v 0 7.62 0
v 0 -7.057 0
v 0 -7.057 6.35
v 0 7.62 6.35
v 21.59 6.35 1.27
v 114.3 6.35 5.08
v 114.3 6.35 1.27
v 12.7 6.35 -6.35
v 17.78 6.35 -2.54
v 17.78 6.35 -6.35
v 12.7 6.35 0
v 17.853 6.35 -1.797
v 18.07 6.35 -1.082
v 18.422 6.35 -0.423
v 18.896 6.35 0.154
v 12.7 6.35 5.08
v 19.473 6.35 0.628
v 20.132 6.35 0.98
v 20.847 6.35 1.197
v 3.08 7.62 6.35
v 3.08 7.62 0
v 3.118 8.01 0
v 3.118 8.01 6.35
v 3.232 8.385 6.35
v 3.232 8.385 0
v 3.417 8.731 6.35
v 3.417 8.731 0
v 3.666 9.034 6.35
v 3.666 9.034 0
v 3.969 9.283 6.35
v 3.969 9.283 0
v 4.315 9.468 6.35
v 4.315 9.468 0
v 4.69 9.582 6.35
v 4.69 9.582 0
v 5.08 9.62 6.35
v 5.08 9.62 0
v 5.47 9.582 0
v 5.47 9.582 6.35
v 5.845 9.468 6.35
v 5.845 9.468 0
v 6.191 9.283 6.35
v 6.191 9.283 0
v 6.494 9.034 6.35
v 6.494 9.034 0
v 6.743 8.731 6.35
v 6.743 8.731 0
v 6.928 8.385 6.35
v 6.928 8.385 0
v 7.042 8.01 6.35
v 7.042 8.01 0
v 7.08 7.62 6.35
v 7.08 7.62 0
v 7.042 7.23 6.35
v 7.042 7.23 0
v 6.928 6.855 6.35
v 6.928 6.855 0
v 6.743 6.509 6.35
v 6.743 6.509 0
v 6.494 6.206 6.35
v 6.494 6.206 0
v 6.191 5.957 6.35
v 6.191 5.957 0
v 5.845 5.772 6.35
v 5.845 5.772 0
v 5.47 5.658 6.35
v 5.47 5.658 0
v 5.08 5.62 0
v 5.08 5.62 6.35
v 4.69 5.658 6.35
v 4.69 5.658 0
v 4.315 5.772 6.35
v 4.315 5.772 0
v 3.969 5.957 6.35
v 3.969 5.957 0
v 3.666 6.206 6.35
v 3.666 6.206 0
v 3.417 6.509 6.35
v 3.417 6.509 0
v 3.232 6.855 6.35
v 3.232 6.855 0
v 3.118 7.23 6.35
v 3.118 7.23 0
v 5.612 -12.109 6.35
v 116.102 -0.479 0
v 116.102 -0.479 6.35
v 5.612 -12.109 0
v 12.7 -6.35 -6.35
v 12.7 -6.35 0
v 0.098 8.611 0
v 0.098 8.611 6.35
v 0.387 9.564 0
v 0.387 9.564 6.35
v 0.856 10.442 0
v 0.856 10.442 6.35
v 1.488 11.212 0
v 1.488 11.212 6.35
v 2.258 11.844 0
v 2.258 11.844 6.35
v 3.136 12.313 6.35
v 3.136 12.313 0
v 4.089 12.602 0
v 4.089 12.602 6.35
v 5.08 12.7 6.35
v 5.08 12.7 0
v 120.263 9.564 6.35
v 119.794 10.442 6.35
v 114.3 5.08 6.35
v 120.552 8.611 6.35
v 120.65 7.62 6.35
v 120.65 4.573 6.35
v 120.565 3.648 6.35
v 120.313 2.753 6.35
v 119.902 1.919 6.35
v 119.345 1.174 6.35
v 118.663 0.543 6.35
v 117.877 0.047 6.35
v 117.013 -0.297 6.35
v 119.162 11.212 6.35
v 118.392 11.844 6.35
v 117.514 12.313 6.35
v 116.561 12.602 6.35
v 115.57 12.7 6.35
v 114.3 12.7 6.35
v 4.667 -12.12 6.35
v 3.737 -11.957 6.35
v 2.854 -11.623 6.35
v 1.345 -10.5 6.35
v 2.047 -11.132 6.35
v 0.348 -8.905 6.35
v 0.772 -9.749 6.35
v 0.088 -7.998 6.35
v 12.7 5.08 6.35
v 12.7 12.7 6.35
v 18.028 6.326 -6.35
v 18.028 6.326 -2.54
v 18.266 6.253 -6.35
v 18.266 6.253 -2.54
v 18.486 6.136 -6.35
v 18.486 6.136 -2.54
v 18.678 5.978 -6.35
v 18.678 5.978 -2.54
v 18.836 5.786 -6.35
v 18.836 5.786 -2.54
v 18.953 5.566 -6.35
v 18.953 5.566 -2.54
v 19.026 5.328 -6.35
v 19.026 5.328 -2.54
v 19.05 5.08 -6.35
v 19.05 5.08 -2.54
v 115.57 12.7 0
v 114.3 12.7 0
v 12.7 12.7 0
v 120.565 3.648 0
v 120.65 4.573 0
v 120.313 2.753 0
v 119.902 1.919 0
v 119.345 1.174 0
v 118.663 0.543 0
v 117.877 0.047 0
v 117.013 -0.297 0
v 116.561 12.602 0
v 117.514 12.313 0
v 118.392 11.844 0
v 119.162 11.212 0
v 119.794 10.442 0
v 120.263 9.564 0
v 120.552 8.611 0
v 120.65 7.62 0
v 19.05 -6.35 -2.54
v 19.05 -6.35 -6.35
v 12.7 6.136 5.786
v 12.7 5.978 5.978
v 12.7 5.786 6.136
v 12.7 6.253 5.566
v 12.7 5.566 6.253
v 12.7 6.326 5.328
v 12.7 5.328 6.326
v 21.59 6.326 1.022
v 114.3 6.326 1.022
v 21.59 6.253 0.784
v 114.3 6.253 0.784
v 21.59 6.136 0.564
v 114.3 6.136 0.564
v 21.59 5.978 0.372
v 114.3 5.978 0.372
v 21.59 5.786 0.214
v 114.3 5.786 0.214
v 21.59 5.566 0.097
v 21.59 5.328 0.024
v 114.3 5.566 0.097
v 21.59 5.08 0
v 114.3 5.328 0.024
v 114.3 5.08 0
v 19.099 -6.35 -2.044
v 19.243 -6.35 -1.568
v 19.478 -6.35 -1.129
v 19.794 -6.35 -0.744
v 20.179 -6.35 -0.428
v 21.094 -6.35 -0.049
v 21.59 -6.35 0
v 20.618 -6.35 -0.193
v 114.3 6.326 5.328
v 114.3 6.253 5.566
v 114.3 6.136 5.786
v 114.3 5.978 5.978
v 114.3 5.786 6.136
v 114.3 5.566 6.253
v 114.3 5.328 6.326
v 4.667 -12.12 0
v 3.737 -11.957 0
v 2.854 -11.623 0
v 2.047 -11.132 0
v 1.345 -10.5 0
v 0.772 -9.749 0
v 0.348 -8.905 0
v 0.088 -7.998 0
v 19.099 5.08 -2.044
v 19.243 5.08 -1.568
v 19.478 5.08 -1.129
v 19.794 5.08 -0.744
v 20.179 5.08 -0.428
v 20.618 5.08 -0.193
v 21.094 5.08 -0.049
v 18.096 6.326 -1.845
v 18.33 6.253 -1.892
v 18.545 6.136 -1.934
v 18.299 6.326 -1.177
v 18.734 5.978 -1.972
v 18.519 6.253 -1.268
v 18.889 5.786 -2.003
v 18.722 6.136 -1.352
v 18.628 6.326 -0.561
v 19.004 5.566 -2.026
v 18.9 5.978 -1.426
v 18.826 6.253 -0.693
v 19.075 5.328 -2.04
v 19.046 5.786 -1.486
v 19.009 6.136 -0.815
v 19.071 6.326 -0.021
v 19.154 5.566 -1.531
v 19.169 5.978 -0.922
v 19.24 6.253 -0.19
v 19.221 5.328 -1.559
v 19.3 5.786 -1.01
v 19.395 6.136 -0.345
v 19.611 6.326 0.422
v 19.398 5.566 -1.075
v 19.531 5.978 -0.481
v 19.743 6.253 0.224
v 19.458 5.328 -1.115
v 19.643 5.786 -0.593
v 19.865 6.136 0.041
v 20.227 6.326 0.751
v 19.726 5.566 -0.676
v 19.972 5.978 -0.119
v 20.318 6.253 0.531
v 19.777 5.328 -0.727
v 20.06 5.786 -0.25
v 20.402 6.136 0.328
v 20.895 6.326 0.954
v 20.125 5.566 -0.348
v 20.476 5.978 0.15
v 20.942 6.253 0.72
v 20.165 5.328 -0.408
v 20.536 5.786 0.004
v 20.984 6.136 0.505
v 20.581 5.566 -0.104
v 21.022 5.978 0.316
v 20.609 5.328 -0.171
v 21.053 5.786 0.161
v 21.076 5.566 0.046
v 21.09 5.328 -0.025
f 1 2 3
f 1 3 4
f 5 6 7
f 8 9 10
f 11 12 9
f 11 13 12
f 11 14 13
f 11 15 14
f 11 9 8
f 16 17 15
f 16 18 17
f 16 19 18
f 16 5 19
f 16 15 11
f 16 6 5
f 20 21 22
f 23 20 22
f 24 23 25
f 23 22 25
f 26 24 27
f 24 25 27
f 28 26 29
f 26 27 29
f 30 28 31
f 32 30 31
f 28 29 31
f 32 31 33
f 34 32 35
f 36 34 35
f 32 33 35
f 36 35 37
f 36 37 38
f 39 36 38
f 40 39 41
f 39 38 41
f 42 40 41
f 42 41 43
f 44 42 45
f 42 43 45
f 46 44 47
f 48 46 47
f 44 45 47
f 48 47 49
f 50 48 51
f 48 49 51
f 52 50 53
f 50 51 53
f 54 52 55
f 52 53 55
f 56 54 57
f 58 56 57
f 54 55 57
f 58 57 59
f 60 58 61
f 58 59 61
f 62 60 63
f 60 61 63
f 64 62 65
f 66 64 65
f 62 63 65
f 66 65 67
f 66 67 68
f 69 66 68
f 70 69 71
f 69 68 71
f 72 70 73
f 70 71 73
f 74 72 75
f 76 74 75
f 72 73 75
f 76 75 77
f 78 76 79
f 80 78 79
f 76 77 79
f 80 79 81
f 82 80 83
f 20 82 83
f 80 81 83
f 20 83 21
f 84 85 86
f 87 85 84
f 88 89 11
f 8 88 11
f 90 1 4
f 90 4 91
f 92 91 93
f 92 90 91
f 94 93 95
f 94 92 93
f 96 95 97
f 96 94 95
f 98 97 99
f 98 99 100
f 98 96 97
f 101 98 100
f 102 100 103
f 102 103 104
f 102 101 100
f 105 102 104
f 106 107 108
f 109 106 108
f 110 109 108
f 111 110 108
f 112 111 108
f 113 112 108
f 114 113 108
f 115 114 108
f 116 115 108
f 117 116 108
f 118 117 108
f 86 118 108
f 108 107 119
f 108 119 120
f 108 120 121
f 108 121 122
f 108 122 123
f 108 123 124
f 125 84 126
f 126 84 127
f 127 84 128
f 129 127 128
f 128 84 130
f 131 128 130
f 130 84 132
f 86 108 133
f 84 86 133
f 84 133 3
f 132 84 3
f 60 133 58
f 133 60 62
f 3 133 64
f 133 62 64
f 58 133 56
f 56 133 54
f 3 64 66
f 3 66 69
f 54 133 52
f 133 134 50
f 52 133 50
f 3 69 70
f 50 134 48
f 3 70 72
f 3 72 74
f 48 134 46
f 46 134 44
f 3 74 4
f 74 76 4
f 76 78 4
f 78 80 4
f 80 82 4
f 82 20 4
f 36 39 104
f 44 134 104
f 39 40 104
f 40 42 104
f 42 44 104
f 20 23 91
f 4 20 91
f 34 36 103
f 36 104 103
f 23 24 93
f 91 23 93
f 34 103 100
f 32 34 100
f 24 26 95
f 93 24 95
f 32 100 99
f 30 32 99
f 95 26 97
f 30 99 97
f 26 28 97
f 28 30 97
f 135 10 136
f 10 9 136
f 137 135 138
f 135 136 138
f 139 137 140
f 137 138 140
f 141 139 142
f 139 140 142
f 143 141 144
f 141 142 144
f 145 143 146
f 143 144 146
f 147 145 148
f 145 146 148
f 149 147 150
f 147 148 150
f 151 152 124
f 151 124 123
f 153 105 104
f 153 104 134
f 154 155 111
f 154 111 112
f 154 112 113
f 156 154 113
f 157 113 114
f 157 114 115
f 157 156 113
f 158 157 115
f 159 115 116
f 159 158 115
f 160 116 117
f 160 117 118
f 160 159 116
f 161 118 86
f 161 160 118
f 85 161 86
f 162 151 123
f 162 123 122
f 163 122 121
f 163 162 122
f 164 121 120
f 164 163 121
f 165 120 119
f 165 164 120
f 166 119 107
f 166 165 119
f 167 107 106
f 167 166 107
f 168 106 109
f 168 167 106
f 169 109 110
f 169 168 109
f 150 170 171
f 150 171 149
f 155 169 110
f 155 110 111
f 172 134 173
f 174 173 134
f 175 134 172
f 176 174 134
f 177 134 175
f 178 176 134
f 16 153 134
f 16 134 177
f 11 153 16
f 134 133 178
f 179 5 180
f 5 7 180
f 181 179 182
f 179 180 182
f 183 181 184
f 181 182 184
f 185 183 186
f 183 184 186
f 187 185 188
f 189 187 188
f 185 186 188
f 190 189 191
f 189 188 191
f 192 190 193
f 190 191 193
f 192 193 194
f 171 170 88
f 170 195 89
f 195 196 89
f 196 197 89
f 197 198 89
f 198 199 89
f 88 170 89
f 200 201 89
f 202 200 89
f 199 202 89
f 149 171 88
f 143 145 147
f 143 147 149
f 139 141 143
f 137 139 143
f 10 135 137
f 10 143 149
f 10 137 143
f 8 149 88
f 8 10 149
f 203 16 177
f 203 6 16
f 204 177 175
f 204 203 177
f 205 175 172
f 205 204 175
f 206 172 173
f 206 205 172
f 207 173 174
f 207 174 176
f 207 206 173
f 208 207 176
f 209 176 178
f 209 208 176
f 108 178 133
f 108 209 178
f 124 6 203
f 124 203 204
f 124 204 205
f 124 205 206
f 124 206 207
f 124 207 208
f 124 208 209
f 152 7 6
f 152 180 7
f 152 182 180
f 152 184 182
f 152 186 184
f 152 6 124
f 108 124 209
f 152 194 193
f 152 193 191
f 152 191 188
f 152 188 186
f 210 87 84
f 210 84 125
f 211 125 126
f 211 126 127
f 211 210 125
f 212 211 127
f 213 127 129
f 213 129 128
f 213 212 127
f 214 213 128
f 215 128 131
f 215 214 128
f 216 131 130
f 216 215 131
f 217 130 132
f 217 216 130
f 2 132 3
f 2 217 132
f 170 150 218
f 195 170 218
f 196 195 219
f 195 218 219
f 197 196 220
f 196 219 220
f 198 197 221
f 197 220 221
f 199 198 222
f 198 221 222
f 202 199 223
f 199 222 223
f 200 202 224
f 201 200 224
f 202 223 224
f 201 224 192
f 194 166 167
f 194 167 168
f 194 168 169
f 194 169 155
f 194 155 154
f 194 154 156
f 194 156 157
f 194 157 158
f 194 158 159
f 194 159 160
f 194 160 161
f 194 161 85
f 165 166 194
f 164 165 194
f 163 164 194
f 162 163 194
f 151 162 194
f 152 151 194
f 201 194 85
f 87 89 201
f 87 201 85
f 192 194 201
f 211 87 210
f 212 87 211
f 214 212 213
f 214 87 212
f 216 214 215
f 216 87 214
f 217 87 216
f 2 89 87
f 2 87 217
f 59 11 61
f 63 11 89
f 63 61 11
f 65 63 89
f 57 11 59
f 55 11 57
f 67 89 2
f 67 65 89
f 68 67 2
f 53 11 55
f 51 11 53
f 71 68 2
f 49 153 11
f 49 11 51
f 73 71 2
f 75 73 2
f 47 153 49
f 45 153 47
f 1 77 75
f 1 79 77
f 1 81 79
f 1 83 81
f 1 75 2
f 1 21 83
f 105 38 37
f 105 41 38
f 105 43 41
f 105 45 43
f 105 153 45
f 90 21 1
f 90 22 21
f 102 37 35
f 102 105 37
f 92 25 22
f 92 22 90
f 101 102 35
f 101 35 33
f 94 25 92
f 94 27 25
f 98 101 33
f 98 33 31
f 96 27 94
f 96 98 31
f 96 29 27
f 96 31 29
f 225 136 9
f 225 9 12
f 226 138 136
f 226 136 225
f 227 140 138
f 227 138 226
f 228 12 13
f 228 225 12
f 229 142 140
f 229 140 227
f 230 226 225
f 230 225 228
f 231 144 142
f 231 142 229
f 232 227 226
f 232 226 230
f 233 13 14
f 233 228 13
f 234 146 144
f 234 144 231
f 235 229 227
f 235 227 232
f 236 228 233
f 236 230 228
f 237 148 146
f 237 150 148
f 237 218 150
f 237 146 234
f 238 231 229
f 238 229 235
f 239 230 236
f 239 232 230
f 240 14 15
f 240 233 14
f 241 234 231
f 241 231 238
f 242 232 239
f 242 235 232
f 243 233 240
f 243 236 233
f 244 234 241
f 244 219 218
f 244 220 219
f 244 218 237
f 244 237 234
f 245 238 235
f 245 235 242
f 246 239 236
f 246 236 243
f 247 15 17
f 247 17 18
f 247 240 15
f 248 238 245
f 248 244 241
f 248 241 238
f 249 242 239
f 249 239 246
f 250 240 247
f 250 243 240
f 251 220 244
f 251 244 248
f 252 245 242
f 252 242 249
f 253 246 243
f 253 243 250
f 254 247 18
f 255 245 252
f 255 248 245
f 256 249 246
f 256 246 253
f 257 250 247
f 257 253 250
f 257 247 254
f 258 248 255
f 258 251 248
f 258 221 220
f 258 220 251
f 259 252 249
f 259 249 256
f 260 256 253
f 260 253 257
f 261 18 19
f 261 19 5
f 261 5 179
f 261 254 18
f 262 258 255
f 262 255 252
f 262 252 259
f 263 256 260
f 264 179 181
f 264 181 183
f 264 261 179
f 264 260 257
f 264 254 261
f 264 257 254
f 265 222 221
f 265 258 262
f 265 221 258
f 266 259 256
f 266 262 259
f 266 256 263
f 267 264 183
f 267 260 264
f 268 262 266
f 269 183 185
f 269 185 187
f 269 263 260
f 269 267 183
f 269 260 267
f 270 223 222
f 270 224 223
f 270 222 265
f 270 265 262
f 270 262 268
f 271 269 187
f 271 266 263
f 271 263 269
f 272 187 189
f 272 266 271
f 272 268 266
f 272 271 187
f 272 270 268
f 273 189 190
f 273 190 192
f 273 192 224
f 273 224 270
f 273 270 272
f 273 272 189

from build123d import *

# Parameters (mm, degrees)
BOSS_EXTRUDE1_DEPTH = 6.35
SKETCH2_W           = 6.35
SKETCH2_H           = 12.7
BOSS_EXTRUDE2_DEPTH = 6.35
FILLET1_R           = 2.54
FILLET2_R           = 1.27
SKETCH3_R           = 2
CUT_EXTRUDE1_DEPTH  = 6.35


with BuildPart() as part:
    # Sketch1 → Boss-Extrude1 (new body)
    with BuildSketch(Plane.XY):
        with BuildLine():
            Line((0, 0), (0, 7.62))
            ThreePointArc((0, 7.62), (1.487897552, 11.212102448), (5.08, 12.7))
            Line((5.08, 12.7), (12.7, 12.7))
            Line((12.7, 12.7), (12.7, 6.35))
            Line((12.7, 6.35), (114.3, 6.35))
            Line((114.3, 6.35), (114.3, 12.7))
            Line((114.3, 12.7), (115.57, 12.7))
            ThreePointArc((115.57, 12.7), (119.162102448, 11.212102448), (120.65, 7.62))
            Line((120.65, 7.62), (120.65, 4.57332967))
            ThreePointArc((120.65, 4.57332967), (119.34544285, 1.174442898), (116.101798705, -0.478758031))
            Line((116.101798705, -0.478758031), (5.611798705, -12.109284347))
            ThreePointArc((5.611798705, -12.109284347), (1.681113228, -10.832639496), (0, -7.057196646))
            Line((0, -7.057196646), (0, 0))
        make_face()
    extrude(amount=BOSS_EXTRUDE1_DEPTH)

    # Sketch2 → Boss-Extrude2 (add)
    with BuildSketch(Plane(origin=(0, 0, 0), x_dir=(-1, 0, 0), z_dir=(0, 0, -1))):
        with Locations((-15.875, 0)):
            Rectangle(SKETCH2_W, SKETCH2_H)
    extrude(amount=BOSS_EXTRUDE2_DEPTH)

    # Fillet1
    fillet1_edges = [part.edges().sort_by_distance(p)[0] for p in [
        (19.05, 0, 0),
    ]]
    fillet(fillet1_edges, radius=FILLET1_R)

    # Fillet2
    fillet2_edges = [part.edges().sort_by_distance(p)[0] for p in [
        (67.945, 6.35, 0),
        (63.5, 6.35, 6.35),
        (19.05, 6.35, -4.445),
        (19.793948776, 6.35, -0.743948776),
    ]]
    fillet(fillet2_edges, radius=FILLET2_R)

    # Sketch3 → Cut-Extrude1 (cut)
    with BuildSketch(Plane(origin=(0, 0, 0), x_dir=(-1, 0, 0), z_dir=(0, 0, -1))):
        with Locations((-5.08, 7.62)):
            Circle(SKETCH3_R)
    extrude(amount=-CUT_EXTRUDE1_DEPTH, mode=Mode.SUBTRACT)


solid = part.part
